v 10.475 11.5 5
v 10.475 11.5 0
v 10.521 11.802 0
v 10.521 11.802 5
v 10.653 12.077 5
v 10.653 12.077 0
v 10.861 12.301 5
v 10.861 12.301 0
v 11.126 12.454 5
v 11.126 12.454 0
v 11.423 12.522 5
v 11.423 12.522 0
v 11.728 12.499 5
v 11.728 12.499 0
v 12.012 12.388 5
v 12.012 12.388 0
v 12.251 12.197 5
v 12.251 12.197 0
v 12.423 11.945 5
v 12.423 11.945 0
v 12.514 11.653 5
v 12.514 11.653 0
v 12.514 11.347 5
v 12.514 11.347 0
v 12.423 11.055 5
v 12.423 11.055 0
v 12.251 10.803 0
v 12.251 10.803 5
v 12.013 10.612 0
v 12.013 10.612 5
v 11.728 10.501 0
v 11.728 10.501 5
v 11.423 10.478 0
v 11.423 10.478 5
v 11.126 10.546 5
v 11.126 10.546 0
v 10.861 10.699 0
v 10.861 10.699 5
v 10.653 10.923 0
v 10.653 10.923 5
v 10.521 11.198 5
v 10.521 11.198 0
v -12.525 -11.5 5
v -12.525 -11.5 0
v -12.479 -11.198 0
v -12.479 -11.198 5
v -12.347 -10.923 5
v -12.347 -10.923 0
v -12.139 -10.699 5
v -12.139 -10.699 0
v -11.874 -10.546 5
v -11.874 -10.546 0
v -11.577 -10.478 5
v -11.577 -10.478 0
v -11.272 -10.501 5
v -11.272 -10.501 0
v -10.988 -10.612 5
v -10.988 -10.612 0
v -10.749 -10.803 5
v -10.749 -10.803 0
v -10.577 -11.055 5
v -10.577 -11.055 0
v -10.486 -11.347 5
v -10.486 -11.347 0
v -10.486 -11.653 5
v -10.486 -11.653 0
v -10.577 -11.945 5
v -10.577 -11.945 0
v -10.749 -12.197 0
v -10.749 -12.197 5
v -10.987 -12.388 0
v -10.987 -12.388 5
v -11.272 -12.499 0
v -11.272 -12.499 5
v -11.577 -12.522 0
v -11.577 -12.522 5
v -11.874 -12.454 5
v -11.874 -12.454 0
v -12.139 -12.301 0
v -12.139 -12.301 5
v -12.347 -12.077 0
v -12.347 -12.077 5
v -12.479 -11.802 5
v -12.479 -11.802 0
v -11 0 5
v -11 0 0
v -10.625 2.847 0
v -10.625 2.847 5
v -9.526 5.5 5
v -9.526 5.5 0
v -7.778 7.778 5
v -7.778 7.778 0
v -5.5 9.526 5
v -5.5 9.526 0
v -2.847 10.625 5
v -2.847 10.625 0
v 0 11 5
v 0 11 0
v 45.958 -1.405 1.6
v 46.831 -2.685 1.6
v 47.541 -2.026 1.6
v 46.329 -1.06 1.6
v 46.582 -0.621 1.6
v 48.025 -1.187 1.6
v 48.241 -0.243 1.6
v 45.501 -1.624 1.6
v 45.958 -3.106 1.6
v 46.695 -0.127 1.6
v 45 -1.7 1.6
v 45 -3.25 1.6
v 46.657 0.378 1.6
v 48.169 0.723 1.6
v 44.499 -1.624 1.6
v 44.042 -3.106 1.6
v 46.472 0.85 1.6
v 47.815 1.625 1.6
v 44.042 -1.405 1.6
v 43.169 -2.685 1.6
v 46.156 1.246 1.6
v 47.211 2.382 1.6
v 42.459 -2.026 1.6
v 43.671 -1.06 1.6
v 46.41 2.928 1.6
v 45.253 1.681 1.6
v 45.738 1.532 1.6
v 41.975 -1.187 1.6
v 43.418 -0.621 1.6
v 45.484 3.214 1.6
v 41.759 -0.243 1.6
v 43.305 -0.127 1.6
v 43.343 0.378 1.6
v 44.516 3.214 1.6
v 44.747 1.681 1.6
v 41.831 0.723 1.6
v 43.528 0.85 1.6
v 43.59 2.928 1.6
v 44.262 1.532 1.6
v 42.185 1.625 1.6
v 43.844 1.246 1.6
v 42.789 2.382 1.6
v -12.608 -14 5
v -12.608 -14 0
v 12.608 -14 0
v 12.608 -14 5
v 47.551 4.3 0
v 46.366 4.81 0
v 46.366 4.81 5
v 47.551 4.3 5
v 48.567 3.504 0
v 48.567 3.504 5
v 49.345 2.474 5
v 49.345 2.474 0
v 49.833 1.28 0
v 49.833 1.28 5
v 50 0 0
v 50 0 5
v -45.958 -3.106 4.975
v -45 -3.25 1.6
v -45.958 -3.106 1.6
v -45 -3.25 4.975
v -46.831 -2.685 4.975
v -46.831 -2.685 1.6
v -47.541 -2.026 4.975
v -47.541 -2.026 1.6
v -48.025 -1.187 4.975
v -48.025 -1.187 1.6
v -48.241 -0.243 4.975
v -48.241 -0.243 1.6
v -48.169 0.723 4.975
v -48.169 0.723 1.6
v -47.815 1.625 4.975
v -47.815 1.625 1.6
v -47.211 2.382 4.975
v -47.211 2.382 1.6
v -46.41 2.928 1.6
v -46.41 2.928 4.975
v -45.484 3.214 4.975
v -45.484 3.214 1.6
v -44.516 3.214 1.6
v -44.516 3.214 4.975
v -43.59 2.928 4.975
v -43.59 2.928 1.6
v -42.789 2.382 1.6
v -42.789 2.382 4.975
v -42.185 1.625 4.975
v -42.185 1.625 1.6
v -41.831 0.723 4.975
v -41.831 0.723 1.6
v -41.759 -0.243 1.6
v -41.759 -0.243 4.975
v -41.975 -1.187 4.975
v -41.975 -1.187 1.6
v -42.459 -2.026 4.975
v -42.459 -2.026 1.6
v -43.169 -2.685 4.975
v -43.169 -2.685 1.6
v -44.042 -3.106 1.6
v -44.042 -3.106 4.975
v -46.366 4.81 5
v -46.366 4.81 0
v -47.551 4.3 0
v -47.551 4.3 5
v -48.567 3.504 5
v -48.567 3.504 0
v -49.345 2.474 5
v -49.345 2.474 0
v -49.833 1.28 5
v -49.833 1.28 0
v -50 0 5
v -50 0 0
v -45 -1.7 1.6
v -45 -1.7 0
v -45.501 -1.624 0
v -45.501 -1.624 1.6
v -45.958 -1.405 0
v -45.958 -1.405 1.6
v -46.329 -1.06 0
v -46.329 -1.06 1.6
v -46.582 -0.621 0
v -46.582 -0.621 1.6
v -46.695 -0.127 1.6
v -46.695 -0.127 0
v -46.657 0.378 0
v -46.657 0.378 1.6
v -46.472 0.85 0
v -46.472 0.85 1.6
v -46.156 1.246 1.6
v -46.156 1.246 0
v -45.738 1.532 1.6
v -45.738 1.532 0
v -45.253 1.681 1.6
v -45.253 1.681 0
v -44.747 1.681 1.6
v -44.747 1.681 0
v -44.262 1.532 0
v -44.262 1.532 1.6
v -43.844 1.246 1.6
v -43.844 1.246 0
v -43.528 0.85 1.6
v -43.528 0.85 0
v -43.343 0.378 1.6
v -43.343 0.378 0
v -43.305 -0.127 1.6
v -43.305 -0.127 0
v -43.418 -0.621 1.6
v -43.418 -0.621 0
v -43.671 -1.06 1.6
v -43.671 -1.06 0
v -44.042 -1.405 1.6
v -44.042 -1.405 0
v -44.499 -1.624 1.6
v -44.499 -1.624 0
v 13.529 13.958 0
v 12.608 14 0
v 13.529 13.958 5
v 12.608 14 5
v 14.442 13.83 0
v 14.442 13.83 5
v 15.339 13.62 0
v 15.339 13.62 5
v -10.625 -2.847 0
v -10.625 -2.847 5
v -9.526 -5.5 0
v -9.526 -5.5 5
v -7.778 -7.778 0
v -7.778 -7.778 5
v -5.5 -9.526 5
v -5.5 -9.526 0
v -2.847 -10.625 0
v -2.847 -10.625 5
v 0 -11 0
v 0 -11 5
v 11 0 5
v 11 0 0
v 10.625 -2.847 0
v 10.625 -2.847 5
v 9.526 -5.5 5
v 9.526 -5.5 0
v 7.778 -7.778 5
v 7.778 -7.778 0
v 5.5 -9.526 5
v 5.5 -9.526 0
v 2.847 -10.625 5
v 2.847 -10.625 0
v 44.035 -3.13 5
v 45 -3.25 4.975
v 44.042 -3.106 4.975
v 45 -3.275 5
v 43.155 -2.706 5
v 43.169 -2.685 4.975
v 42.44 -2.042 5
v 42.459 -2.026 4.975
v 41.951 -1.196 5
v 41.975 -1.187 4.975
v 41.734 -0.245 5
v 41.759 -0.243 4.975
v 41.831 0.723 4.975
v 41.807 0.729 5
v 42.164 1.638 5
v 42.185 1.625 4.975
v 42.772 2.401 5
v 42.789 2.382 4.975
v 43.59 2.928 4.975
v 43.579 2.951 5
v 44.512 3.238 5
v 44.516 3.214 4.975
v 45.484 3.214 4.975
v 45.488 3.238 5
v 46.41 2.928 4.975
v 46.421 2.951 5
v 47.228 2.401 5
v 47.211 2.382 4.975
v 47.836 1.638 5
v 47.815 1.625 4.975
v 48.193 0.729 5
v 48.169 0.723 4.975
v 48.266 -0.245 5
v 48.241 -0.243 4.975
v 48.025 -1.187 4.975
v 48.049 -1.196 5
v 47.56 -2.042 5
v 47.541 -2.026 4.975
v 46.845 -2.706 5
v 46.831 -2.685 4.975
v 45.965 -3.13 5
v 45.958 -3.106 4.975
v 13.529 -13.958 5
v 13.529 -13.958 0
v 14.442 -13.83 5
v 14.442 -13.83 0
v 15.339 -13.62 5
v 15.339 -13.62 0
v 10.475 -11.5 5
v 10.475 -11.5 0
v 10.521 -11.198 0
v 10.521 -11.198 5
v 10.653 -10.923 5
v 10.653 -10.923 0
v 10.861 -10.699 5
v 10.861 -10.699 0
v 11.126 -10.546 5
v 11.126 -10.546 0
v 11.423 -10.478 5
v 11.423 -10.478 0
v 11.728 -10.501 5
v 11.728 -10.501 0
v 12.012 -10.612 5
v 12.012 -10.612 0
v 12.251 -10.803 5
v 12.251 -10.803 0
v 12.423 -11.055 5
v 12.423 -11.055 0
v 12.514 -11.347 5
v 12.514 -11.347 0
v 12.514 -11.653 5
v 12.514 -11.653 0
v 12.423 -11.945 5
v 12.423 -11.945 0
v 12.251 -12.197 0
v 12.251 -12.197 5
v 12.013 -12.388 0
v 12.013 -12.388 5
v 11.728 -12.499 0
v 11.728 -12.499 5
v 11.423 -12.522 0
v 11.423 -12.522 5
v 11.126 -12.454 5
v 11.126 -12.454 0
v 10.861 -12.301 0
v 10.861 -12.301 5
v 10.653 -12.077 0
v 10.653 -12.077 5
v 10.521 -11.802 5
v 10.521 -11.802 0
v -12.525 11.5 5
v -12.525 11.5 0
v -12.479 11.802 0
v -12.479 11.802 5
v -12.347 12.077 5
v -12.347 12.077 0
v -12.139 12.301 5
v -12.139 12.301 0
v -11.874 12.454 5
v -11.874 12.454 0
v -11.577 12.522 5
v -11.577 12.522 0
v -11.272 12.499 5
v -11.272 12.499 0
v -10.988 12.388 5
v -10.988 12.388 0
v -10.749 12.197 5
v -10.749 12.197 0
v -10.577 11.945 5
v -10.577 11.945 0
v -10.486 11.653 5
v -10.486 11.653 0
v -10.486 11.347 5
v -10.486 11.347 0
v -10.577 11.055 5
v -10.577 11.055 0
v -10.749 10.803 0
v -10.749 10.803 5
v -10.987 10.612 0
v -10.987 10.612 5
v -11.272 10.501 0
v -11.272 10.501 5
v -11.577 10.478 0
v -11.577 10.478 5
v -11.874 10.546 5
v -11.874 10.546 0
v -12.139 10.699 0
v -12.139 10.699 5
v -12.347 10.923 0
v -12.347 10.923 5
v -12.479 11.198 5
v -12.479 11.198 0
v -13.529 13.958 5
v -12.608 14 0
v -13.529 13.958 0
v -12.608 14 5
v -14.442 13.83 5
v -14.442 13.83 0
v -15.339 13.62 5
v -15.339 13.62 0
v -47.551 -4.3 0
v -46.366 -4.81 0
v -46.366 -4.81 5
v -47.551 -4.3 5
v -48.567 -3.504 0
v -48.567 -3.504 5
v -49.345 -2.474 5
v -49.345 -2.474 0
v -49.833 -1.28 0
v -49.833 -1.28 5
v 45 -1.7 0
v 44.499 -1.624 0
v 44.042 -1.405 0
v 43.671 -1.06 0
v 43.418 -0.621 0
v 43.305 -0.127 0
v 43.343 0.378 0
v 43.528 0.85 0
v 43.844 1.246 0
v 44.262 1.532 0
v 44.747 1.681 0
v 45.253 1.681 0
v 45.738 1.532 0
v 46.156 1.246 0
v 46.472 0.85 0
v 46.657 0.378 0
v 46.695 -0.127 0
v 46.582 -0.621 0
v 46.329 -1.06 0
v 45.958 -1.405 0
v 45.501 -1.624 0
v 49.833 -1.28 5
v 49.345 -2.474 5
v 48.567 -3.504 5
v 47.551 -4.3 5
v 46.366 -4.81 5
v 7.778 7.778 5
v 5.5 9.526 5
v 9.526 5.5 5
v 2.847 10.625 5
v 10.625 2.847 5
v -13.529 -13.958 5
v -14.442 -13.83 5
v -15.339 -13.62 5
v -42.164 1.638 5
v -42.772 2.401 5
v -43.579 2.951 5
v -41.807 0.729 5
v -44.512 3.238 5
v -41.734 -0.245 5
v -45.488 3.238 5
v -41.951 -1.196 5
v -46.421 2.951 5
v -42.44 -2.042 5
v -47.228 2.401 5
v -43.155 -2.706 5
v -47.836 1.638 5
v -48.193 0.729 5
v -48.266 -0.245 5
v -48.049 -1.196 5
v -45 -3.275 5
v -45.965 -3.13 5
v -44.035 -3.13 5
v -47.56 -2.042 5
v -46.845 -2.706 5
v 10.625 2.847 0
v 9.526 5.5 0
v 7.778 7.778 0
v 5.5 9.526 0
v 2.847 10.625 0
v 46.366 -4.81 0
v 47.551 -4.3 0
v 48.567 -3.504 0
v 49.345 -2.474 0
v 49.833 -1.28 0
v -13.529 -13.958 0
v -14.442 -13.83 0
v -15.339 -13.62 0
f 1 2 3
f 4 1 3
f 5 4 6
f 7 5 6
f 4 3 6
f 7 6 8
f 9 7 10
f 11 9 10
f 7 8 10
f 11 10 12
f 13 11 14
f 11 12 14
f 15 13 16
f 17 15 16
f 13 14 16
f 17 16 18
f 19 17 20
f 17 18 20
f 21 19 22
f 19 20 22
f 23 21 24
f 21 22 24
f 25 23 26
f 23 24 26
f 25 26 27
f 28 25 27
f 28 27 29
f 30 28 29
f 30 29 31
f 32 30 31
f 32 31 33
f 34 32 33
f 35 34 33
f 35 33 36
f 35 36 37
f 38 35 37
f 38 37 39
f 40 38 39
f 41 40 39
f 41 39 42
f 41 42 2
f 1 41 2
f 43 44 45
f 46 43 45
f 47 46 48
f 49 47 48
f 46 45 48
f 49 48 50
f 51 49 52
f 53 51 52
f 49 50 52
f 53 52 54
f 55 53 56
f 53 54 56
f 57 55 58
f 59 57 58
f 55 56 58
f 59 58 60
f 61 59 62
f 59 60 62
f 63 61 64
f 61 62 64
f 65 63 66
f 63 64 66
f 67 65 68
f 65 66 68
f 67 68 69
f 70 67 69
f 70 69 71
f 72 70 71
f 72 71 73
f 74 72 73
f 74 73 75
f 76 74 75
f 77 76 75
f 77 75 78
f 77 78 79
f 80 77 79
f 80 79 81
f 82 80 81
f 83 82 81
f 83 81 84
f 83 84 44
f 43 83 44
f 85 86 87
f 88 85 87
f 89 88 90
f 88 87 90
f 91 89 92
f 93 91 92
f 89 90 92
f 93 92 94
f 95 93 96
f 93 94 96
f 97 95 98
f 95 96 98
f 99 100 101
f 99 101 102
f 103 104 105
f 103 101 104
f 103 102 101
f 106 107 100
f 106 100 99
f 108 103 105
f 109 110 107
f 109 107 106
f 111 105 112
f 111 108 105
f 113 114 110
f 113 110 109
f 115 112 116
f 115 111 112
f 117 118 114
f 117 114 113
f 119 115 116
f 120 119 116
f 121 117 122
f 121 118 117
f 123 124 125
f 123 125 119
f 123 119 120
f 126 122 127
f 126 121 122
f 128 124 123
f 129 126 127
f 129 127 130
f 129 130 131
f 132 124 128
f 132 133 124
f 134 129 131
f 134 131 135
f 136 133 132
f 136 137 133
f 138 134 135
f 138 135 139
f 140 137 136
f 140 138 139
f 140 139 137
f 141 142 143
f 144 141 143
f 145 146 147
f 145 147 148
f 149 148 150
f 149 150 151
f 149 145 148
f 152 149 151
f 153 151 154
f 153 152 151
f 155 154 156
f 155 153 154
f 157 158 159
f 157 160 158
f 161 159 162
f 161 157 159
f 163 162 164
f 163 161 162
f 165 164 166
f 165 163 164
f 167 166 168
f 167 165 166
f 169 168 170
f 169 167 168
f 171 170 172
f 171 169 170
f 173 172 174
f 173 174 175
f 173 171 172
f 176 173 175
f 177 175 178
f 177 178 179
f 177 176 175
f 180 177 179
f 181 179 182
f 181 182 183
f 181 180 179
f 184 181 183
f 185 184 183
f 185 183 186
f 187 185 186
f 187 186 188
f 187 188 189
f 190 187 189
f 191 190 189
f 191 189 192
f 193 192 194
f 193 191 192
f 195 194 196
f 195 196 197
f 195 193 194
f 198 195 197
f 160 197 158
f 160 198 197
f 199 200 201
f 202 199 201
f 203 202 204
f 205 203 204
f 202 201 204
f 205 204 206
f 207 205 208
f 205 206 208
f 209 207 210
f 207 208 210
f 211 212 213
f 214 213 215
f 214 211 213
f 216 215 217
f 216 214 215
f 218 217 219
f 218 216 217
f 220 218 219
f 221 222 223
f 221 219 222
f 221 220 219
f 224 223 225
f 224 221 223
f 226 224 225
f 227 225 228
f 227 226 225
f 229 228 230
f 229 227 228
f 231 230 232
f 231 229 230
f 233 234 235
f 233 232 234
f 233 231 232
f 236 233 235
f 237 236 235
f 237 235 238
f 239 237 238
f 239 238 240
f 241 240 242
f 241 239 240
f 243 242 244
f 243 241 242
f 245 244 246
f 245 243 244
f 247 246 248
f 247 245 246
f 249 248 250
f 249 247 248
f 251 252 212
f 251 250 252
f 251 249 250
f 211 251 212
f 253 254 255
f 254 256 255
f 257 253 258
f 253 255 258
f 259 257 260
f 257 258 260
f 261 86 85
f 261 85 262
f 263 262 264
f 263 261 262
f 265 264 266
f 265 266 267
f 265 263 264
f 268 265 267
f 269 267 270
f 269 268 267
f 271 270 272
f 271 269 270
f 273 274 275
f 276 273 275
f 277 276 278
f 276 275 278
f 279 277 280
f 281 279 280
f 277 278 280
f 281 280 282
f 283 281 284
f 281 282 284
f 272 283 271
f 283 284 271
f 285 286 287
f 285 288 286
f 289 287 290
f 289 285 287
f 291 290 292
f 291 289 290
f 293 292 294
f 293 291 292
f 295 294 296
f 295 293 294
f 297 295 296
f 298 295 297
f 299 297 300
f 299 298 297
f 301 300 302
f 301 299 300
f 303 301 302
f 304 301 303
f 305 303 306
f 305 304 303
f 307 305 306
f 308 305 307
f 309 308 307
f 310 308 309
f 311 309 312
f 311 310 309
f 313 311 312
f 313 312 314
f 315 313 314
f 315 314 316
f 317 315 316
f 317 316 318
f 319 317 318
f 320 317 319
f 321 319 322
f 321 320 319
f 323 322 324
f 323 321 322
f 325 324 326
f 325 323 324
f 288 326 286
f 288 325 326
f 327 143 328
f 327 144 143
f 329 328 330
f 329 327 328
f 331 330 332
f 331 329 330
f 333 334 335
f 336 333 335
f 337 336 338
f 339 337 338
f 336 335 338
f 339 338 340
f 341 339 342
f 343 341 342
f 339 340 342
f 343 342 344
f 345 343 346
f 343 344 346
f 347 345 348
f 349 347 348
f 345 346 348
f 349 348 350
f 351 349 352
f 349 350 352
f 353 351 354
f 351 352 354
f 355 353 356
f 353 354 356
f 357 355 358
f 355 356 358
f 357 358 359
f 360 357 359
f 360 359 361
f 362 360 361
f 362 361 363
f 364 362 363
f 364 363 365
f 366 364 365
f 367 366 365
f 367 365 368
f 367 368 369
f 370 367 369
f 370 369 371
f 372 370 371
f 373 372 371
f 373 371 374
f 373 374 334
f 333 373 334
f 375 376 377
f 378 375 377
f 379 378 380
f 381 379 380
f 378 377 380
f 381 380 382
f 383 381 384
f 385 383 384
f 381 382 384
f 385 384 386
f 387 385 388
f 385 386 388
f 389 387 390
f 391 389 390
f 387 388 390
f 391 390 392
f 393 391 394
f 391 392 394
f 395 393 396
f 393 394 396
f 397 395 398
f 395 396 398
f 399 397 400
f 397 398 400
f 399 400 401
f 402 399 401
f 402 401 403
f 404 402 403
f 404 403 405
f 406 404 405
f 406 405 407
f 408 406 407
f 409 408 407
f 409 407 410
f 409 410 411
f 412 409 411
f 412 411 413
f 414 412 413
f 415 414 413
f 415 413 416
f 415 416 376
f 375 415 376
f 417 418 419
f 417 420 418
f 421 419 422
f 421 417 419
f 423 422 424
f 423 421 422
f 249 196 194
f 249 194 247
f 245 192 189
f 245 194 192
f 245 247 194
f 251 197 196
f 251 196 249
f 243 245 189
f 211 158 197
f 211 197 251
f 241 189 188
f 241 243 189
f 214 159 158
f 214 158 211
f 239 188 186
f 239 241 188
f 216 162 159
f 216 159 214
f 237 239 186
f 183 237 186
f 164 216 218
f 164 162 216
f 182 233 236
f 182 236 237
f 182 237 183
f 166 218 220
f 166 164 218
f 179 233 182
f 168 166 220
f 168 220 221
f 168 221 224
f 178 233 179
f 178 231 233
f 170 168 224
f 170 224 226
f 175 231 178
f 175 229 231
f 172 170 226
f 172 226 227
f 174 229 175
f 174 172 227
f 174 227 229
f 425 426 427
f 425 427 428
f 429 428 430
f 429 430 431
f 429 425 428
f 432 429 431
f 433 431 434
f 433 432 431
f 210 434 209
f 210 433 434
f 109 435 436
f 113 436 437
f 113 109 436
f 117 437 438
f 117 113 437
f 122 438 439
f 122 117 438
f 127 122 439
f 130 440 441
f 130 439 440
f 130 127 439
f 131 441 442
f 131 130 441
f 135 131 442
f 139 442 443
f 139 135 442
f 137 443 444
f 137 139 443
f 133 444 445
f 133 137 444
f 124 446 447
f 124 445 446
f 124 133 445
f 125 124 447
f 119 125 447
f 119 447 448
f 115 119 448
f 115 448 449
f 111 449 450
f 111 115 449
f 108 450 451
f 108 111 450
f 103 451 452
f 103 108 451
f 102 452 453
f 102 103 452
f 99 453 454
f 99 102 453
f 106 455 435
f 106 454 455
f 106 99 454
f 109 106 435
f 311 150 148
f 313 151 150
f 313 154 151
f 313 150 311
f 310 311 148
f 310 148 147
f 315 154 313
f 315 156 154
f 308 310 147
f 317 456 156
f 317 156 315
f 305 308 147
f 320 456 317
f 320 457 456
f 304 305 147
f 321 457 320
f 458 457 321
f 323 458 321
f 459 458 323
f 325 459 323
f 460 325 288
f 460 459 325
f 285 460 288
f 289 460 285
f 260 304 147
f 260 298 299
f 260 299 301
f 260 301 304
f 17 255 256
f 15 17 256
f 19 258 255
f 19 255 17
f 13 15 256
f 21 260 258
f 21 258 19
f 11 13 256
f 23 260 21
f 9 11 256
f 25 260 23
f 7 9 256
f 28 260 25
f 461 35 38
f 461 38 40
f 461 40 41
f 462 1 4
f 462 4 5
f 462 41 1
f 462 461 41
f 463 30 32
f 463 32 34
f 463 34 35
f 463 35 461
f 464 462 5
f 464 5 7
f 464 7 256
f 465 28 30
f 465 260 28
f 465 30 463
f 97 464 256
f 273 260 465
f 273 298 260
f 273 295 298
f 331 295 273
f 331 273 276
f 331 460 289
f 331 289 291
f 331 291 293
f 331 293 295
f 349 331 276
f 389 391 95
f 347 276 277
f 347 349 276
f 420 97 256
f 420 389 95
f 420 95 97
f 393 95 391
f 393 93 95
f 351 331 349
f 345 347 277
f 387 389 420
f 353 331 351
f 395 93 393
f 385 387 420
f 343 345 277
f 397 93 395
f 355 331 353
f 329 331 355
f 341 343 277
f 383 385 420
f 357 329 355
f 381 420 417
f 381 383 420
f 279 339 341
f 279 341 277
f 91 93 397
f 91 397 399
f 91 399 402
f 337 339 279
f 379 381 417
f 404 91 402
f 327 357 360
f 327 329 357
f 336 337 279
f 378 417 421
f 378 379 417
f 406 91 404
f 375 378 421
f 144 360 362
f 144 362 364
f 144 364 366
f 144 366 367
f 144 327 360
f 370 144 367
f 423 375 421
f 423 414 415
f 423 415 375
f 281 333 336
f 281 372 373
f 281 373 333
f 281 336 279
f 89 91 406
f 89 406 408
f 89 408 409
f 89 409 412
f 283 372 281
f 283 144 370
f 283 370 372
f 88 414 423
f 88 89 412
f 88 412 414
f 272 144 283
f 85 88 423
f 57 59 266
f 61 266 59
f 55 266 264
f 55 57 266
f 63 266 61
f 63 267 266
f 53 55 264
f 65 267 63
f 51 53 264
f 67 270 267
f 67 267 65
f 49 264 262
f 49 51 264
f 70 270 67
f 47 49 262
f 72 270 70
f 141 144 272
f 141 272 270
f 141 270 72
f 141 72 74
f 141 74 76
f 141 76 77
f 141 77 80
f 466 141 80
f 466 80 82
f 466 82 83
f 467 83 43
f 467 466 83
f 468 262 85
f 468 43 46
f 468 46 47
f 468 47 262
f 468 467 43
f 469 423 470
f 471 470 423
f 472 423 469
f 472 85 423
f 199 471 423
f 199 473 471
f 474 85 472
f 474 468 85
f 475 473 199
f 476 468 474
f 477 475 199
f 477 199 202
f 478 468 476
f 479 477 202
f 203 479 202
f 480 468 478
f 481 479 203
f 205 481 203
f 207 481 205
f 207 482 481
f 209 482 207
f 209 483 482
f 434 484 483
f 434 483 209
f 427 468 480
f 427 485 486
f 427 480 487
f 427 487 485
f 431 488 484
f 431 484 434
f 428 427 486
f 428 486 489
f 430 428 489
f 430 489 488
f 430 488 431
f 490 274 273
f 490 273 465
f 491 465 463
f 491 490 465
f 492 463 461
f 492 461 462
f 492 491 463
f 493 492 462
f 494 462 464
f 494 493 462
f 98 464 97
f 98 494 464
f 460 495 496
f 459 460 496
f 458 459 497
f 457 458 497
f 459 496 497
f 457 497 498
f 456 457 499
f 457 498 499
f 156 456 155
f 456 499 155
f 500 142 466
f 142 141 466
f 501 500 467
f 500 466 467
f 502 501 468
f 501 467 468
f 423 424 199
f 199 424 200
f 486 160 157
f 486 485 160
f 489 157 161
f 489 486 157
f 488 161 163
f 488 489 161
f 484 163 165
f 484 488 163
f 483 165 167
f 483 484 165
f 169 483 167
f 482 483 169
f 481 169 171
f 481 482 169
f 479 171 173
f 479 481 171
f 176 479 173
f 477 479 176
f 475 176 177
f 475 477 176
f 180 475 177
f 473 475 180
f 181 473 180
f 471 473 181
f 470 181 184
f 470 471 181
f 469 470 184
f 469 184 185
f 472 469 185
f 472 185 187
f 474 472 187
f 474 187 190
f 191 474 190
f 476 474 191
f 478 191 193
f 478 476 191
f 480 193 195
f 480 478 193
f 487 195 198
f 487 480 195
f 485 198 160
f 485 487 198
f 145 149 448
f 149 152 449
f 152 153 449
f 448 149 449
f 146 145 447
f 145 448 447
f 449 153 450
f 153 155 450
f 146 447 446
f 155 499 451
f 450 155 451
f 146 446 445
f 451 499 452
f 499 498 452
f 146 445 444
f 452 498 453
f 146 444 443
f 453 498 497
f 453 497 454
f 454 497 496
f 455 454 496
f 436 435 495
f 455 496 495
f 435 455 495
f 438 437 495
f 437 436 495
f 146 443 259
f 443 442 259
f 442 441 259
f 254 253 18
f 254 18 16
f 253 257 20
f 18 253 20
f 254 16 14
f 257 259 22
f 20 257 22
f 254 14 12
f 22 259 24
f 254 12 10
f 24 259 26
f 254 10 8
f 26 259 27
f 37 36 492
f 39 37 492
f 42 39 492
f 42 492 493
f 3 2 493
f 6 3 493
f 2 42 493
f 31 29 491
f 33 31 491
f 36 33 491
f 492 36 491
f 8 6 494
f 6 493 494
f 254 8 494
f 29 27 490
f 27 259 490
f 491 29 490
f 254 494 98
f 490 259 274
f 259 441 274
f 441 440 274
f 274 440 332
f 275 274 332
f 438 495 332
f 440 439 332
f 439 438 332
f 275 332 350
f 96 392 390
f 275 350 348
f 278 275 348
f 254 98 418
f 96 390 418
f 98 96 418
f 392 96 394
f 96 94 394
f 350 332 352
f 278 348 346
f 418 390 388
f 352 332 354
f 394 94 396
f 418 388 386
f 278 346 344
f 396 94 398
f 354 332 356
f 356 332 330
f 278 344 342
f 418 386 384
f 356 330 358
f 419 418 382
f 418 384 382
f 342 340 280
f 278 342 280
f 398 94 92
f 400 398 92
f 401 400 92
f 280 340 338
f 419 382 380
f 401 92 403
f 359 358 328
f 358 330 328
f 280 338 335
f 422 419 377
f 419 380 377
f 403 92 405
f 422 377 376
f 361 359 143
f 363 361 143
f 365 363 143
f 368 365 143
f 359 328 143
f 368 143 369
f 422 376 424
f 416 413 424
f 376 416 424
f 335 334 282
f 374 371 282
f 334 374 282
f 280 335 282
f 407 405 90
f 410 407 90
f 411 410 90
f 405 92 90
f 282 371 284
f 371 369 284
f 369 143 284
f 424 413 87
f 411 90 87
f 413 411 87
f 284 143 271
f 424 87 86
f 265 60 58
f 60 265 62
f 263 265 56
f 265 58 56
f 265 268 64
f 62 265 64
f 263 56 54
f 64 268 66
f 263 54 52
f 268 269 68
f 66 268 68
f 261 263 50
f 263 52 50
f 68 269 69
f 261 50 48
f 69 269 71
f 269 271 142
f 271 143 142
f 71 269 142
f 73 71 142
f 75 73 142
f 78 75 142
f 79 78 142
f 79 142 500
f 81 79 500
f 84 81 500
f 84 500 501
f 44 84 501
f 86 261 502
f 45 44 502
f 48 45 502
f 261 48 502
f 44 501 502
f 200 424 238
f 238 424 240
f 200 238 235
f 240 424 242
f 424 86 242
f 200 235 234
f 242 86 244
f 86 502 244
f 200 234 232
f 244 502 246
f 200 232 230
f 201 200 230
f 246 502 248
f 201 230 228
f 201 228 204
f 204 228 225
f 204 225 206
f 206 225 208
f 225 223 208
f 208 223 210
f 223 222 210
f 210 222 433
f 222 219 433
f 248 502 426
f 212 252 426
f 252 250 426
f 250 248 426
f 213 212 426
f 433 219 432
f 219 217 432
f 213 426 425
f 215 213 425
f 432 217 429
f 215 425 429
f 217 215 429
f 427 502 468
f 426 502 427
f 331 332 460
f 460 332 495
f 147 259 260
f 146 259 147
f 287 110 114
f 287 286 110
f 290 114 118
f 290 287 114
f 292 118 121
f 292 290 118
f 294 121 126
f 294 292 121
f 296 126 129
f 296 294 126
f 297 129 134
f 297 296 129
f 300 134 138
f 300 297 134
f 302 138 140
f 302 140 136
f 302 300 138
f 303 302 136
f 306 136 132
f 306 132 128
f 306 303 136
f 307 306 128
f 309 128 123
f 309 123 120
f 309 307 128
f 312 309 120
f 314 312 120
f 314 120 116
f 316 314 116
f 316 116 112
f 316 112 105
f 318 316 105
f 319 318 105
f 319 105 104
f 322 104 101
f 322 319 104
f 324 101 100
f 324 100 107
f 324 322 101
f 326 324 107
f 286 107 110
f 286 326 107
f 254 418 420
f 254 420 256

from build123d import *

# Parameters (mm, degrees)
BOSS_EXTRUDE1_DEPTH                          = 5
FILLET1_R                                    = 10
CBORE_FOR_M3_HEX_SOCKET_HEAD_CAP_SCR_2_COUNT = 2
CBORE_FOR_M3_HEX_SOCKET_HEAD_CAP_SCR_2_PITCH = 90
M2_5_TAPPED_HOLE1_D                          = 2.05
M2_5_TAPPED_HOLE1_DEPTH                      = 6.35
M2_5_TAPPED_HOLE1_TIP                        = 0.615882135


with BuildPart() as part:
    # Sketch1 → Boss-Extrude1 (new body)
    with BuildSketch(Plane.XY):
        with BuildLine():
            Line((0, 11), (0, 14))
            Line((0, 14), (-14, 14))
            Line((-14, 14), (-46.365742902, 4.809859283))
            ThreePointArc((-46.365742902, 4.809859283), (-48.989280293, 3.014239995), (-50, 0))
            Line((-50, 0), (-45, 0))
            Line((-45, 0), (-11, 0))
            ThreePointArc((-11, 0), (-7.778174593, 7.778174593), (0, 11))
        make_face()
    extrude(amount=BOSS_EXTRUDE1_DEPTH)

    # Fillet1
    fillet1_edges = [part.edges().sort_by_distance(p)[0] for p in [
        (-14, 14, 2.5),
    ]]
    fillet(fillet1_edges, radius=FILLET1_R)

    # Mirror1: part across plane


with BuildPart() as part_1:
    add(part.part)
    add(part.part.mirror(Plane(origin=(-45, 0, 5), x_dir=(0, 0, 1), z_dir=(0, -1, 0))))

    # Mirror2: part across plane


with BuildPart() as part_2:
    add(part_1.part)
    add(part_1.part.mirror(Plane(origin=(0, -11, 5), x_dir=(0, 0, 1), z_dir=(-1, 0, 0))))

    # Sketch4 → CBORE for M3 Hex Socket Head Cap Screw1 (revolve, cut)
    with BuildSketch(Plane(origin=(-45, 0, 5), x_dir=(0, -1, 0), z_dir=(1, 0, 0))):
        Polygon((0, 0), (0, 12.521463052), (1.7, 11.5), (1.7, 3.4), (3.25, 3.4), (3.25, 0.025), (3.275, 0), align=None)
    cbore_for_m3_hex_socket_head_cap_screw1 = revolve(axis=Axis((-45, 0, 11.35), (0, 0, -1)), mode=Mode.SUBTRACT)

    # CBORE for M3 Hex Socket Head Cap Scr 2: CBORE for M3 Hex Socket Head Cap Screw1 ×2
    with Locations(*[(i * CBORE_FOR_M3_HEX_SOCKET_HEAD_CAP_SCR_2_PITCH, 0, 0) for i in range(1, CBORE_FOR_M3_HEX_SOCKET_HEAD_CAP_SCR_2_COUNT)]):
        add(cbore_for_m3_hex_socket_head_cap_screw1, mode=Mode.SUBTRACT)

    # M2.5 Tapped Hole1
    with Locations(Plane.XY.offset(5)):
        with Locations((-11.5, 11.5), (11.5, 11.5), (11.5, -11.5), (-11.5, -11.5)):
            Hole(M2_5_TAPPED_HOLE1_D / 2, depth=M2_5_TAPPED_HOLE1_DEPTH)
            with Locations((0, 0, -(M2_5_TAPPED_HOLE1_DEPTH + M2_5_TAPPED_HOLE1_TIP / 2))):  # 118° drill point
                Cone(0, M2_5_TAPPED_HOLE1_D / 2, M2_5_TAPPED_HOLE1_TIP, mode=Mode.SUBTRACT)


solid = part_2.part
